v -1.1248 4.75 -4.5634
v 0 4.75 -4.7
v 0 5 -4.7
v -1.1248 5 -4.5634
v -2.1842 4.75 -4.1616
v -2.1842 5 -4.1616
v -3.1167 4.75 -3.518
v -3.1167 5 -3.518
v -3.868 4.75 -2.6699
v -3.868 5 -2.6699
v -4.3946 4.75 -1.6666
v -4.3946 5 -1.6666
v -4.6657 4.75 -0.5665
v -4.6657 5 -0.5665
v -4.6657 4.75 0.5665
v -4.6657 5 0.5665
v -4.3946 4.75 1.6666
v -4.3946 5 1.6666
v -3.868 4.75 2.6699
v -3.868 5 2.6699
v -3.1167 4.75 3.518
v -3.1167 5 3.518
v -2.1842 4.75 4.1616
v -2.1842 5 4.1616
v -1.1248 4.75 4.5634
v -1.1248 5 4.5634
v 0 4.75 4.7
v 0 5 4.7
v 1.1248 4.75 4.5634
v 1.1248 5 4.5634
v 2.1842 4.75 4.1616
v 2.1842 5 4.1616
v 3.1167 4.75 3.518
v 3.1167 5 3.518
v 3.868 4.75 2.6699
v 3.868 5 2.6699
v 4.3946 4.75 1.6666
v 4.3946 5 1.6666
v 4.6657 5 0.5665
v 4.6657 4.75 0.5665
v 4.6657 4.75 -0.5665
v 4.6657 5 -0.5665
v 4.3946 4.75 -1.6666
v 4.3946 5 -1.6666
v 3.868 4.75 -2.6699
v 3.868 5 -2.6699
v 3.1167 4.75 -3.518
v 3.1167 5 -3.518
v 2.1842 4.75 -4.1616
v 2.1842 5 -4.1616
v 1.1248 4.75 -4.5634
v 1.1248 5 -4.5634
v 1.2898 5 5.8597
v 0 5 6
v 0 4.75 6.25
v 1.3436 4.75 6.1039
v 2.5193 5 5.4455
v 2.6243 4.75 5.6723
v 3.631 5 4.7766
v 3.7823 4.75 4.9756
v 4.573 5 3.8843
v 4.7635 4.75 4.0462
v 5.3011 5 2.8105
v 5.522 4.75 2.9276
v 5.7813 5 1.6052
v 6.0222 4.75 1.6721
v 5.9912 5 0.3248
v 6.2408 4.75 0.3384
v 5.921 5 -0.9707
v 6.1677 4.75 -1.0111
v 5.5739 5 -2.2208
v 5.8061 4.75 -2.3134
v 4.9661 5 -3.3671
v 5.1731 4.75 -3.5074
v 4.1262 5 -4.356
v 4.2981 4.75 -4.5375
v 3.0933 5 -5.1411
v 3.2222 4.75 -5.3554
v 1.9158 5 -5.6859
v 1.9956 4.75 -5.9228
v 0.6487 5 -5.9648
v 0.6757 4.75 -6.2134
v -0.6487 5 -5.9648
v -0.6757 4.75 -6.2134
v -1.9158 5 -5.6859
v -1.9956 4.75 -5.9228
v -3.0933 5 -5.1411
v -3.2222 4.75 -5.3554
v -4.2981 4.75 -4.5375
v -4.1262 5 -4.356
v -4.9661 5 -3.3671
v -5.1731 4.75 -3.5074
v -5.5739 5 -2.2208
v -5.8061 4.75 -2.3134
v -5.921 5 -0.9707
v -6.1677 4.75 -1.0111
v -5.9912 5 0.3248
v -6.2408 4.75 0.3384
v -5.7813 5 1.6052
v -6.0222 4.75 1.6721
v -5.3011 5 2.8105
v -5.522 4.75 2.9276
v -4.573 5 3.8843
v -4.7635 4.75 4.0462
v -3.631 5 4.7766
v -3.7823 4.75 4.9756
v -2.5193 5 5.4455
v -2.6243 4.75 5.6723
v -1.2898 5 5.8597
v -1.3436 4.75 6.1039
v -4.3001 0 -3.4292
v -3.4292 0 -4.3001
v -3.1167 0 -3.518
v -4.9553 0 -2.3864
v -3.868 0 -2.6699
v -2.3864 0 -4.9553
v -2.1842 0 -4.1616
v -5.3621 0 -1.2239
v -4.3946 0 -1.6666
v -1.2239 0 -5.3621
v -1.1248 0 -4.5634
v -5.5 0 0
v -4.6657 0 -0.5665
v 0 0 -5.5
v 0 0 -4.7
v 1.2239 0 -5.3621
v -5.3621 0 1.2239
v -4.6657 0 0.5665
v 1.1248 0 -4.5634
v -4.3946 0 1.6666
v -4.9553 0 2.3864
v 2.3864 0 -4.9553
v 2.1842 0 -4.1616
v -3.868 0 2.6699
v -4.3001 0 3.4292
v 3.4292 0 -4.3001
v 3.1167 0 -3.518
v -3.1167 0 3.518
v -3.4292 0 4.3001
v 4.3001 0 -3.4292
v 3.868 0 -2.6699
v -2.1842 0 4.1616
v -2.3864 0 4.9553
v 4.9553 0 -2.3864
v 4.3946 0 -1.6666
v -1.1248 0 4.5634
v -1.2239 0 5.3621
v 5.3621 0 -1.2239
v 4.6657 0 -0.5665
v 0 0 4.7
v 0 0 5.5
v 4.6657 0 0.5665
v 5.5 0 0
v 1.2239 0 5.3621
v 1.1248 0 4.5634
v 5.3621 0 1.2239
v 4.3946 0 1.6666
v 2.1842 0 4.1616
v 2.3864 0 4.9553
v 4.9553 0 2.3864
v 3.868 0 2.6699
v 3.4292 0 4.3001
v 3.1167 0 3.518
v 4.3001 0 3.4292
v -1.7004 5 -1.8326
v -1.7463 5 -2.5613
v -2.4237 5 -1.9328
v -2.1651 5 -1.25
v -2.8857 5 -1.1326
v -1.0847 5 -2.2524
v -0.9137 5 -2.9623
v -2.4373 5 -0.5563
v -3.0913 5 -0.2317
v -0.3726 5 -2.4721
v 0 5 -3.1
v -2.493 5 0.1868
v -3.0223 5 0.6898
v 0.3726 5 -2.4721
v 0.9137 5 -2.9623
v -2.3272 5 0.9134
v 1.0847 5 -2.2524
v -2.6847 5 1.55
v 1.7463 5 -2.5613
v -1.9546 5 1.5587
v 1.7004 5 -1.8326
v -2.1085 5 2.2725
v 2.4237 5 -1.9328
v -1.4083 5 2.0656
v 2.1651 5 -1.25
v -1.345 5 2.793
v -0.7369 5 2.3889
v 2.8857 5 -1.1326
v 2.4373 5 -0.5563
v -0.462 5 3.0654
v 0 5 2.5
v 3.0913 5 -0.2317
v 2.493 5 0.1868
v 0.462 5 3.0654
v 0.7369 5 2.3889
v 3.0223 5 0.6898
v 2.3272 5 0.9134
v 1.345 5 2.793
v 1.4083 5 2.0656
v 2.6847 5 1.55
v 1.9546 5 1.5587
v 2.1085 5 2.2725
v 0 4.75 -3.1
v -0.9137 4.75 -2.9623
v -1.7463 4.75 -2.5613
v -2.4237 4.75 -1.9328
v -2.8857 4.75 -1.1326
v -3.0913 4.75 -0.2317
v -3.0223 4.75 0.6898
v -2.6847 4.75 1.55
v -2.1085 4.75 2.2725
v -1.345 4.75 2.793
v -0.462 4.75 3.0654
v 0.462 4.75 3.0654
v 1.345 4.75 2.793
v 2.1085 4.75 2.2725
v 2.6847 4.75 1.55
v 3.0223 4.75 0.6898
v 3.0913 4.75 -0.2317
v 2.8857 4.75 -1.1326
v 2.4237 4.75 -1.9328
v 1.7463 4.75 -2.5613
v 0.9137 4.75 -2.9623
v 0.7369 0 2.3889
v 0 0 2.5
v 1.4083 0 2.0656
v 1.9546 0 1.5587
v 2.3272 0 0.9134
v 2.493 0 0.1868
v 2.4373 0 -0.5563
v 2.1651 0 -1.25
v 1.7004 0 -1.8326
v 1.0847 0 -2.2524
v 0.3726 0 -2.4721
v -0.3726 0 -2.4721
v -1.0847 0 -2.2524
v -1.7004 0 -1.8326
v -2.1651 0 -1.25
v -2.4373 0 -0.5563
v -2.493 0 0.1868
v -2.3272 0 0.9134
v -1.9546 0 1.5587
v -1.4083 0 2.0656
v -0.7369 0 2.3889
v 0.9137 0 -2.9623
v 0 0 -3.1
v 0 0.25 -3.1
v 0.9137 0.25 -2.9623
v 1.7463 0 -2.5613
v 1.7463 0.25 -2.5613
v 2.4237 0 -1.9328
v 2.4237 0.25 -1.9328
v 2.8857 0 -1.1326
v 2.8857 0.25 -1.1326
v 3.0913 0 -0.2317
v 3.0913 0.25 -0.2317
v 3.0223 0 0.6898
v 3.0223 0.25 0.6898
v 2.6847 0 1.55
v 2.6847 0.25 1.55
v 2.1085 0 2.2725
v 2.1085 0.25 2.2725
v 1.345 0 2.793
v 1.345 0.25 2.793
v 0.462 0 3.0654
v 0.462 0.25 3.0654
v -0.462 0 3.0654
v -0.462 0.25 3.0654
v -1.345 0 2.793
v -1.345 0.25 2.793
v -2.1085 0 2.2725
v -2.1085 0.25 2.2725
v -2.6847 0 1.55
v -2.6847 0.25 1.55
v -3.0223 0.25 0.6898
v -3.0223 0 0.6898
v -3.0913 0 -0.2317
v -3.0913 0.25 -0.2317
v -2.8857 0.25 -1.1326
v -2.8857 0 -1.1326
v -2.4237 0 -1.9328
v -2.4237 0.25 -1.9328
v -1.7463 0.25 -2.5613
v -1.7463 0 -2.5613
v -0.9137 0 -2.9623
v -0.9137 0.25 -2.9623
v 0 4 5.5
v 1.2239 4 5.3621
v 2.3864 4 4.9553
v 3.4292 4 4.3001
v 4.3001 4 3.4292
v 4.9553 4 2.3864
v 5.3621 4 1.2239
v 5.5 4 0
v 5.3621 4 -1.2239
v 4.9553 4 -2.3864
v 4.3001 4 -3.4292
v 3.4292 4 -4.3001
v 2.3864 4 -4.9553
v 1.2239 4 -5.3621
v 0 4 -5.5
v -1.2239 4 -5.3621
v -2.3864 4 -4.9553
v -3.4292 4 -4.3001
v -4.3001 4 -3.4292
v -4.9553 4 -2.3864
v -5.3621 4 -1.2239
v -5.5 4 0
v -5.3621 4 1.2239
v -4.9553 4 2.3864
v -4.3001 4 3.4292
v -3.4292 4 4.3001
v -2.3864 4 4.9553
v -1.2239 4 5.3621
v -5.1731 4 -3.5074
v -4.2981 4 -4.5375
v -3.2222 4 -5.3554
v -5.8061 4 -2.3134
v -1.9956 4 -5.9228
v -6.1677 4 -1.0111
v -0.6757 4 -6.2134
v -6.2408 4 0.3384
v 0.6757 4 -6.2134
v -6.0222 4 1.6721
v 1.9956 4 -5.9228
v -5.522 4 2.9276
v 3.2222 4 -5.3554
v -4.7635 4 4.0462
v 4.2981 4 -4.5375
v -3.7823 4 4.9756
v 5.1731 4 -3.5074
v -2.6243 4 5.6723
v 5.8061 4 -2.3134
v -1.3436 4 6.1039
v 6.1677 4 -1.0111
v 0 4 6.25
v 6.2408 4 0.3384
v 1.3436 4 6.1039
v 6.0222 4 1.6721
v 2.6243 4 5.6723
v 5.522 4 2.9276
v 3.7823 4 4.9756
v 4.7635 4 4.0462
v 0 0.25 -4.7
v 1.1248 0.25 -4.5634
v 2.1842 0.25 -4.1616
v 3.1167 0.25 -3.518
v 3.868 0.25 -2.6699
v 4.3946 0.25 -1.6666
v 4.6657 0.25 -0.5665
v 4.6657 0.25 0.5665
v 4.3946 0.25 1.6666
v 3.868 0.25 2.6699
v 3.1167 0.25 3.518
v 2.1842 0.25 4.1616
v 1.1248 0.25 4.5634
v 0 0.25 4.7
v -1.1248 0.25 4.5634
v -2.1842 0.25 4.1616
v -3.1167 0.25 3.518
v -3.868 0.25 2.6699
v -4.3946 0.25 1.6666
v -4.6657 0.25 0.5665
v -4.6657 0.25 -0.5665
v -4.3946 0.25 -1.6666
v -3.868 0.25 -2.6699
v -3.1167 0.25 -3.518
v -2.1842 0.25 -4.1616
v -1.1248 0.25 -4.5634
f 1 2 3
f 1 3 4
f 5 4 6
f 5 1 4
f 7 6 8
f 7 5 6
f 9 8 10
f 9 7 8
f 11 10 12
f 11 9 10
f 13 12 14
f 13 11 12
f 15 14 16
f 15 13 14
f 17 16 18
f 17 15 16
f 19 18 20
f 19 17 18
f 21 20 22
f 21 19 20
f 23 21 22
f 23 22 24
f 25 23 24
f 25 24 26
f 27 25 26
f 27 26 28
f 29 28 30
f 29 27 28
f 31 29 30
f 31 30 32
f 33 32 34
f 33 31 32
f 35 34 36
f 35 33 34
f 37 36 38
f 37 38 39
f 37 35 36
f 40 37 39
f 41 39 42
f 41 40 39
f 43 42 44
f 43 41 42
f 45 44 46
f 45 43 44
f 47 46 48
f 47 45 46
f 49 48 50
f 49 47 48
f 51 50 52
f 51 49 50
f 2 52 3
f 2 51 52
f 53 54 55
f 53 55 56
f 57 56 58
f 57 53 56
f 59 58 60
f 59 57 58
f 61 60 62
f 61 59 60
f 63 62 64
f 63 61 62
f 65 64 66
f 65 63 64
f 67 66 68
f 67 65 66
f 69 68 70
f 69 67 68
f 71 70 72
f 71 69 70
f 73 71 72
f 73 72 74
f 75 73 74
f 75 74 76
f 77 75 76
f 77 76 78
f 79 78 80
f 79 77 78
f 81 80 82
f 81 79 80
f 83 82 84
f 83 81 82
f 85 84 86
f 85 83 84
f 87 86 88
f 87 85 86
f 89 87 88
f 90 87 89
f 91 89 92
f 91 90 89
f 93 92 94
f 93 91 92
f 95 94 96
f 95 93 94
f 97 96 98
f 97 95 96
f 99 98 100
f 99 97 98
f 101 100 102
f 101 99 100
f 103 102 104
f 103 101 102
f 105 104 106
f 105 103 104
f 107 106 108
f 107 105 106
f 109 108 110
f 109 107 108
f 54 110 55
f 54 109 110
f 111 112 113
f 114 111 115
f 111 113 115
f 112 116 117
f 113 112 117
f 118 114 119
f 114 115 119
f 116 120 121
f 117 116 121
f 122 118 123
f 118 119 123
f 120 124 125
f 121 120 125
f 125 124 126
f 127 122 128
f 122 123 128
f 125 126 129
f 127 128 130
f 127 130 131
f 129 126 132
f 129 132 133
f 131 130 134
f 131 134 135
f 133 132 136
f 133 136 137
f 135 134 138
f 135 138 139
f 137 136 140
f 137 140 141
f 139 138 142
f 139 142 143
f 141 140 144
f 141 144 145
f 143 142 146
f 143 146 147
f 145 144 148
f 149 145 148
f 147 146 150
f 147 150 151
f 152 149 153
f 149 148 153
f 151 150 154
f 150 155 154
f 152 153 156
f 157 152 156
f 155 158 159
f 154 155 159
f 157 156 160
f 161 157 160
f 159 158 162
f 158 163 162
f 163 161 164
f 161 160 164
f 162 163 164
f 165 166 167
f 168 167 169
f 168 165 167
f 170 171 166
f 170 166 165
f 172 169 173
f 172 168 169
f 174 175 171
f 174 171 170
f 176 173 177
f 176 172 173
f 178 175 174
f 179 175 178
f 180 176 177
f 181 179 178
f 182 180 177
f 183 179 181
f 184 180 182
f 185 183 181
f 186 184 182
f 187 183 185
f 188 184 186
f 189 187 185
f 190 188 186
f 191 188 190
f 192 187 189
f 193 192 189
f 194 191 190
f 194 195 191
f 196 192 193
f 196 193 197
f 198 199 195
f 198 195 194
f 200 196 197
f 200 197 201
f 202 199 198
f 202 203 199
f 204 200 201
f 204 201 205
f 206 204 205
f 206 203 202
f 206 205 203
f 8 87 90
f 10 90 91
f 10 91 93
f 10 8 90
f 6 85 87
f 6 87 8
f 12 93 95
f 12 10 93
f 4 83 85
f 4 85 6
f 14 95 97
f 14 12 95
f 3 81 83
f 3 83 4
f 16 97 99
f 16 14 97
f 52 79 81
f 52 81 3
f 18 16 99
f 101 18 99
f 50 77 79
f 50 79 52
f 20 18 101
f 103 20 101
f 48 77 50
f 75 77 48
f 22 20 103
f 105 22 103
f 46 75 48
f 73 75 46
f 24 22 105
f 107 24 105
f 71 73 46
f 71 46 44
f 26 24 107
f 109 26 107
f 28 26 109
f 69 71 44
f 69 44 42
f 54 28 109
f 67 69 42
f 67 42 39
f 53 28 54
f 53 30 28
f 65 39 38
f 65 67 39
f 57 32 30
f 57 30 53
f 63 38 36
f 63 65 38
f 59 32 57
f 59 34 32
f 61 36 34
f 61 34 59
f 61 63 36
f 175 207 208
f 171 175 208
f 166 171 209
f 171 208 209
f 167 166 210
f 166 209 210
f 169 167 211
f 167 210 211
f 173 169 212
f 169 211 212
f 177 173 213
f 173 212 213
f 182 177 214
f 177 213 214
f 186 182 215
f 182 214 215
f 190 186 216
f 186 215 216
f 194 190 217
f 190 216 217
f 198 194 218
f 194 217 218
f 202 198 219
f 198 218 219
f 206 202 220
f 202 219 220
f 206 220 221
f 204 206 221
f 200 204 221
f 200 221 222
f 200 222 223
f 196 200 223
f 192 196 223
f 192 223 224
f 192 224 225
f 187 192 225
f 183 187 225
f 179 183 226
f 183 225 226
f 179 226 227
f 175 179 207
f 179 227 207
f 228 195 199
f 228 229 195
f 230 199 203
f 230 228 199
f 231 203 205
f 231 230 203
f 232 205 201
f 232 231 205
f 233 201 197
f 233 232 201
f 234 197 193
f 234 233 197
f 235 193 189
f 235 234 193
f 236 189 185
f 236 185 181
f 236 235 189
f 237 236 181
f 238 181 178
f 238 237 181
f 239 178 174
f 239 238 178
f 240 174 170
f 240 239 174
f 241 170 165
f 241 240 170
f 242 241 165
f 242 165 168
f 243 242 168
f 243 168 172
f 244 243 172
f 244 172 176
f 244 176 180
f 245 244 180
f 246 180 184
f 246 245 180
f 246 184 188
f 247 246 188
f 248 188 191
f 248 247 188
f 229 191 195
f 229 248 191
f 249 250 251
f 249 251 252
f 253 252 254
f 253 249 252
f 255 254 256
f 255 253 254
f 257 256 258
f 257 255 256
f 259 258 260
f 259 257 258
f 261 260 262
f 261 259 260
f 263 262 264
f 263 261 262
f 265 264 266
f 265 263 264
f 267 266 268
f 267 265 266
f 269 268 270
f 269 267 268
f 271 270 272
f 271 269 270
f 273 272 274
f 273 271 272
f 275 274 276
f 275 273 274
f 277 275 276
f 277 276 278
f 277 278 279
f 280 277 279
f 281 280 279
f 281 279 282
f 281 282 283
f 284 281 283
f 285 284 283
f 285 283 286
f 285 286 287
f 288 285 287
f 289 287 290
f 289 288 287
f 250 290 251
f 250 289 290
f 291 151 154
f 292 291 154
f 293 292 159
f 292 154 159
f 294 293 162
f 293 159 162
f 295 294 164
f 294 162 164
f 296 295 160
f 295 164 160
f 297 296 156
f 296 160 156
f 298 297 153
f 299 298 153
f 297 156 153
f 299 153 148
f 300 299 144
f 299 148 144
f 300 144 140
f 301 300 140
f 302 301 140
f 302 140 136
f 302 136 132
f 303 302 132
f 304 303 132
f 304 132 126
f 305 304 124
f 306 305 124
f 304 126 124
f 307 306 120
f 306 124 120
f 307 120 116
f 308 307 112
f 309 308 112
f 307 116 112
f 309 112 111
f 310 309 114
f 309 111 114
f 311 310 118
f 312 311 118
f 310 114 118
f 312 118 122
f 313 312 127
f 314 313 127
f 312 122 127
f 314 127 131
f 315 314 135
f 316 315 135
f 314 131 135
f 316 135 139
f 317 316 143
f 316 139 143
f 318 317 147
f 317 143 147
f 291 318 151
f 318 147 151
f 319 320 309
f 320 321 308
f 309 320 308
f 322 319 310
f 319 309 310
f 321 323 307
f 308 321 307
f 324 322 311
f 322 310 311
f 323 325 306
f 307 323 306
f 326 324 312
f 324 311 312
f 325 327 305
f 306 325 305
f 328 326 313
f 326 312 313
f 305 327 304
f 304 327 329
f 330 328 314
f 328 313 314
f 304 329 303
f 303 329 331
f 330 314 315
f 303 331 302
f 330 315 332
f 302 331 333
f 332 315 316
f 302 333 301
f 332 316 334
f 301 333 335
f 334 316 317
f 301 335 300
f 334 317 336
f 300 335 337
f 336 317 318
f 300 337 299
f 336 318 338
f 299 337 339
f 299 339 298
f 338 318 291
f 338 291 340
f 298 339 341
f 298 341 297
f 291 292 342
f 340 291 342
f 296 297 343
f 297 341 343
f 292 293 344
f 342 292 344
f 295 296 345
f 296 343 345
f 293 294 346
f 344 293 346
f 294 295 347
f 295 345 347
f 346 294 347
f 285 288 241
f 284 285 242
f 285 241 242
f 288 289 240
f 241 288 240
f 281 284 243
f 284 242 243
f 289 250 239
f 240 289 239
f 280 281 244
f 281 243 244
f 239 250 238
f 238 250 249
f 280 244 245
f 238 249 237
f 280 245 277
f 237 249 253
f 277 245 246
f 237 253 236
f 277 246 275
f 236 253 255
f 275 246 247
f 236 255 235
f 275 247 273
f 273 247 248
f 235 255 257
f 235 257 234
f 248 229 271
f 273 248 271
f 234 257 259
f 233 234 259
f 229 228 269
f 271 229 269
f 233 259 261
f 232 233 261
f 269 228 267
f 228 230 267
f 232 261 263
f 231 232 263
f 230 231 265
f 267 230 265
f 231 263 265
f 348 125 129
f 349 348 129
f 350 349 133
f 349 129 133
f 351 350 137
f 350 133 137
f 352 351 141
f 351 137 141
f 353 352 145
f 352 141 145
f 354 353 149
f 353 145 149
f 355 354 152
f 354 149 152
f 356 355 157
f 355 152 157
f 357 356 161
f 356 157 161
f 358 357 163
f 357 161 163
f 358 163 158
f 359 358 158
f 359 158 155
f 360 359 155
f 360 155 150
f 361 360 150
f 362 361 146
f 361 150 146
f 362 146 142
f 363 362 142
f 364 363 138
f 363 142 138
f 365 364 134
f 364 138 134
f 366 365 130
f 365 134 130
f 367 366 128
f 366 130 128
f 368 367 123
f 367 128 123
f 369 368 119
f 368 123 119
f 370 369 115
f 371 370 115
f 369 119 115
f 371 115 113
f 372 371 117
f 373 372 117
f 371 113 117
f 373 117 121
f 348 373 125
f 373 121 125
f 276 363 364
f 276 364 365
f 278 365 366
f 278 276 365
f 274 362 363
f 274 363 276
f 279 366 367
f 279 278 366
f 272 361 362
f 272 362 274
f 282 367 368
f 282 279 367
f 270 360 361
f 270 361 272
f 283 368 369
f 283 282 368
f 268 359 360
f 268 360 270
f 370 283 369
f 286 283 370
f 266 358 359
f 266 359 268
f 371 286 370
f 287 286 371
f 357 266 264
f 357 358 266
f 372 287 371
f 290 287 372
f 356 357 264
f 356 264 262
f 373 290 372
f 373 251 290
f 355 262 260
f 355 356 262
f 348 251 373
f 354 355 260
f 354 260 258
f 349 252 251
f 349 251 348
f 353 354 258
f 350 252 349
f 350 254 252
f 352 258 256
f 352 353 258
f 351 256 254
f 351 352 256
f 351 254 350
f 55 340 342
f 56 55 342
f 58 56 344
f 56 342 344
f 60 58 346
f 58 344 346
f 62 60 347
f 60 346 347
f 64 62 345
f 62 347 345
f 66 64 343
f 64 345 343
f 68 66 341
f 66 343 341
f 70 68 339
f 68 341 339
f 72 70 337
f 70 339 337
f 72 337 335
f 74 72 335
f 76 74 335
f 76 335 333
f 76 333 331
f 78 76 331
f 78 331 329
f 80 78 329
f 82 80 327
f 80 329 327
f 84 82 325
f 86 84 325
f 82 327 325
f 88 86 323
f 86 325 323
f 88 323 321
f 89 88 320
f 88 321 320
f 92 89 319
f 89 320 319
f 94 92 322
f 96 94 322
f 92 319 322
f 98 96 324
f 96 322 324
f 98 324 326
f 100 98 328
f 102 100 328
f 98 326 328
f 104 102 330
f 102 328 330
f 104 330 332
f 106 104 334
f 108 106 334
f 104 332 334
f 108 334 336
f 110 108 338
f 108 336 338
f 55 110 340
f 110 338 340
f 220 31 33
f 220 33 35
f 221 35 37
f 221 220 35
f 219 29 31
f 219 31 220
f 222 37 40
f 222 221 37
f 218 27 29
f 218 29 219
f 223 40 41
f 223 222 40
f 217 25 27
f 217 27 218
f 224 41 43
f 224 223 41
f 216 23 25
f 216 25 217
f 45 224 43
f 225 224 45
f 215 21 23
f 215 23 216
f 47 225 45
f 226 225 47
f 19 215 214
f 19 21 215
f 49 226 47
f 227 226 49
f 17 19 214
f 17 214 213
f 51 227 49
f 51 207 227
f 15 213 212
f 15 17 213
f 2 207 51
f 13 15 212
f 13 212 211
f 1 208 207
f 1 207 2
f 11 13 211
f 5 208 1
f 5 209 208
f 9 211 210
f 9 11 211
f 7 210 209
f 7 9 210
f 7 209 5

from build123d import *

# Parameters (mm, degrees)
SKETCH1_R           = 5.5
SKETCH1_R_2         = 2.5
BOSS_EXTRUDE1_DEPTH = 4
SKETCH2_R           = 6.25
SKETCH2_R_2         = 2.5
BOSS_EXTRUDE2_DEPTH = 1
SKETCH3_R           = 4.7
SKETCH3_R_2         = 3.1
CUT_EXTRUDE1_DEPTH  = 0.25
CUT_EXTRUDE2_START  = -0.25
SKETCH4_R           = 4.7
SKETCH4_R_2         = 3.1
CUT_EXTRUDE2_DEPTH  = 0.25
CHAMFER1_SIZE       = 0.25


with BuildPart() as part:
    # Sketch1 → Boss-Extrude1 (new body)
    with BuildSketch(Plane(origin=(0, 0, 0), x_dir=(1, 0, 0), z_dir=(0, 1, 0))):
        Circle(SKETCH1_R)
        Circle(SKETCH1_R_2, mode=Mode.SUBTRACT)
    extrude(amount=BOSS_EXTRUDE1_DEPTH)

    # Sketch2 → Boss-Extrude2 (add)
    with BuildSketch(Plane(origin=(0, 4, 0), x_dir=(1, 0, 0), z_dir=(0, 1, 0))):
        Circle(SKETCH2_R)
        Circle(SKETCH2_R_2, mode=Mode.SUBTRACT)
    extrude(amount=BOSS_EXTRUDE2_DEPTH)

    # Sketch3 → Cut-Extrude1 (cut)
    with BuildSketch(Plane.XZ):
        Circle(SKETCH3_R)
        Circle(SKETCH3_R_2, mode=Mode.SUBTRACT)
    extrude(amount=-CUT_EXTRUDE1_DEPTH, mode=Mode.SUBTRACT)

    # Sketch4 → Cut-Extrude2 (cut)
    with BuildSketch(Plane(origin=(0, 5, 0), x_dir=(1, 0, 0), z_dir=(0, 1, 0)).offset(CUT_EXTRUDE2_START)):
        Circle(SKETCH4_R)
        Circle(SKETCH4_R_2, mode=Mode.SUBTRACT)
    extrude(amount=CUT_EXTRUDE2_DEPTH, mode=Mode.SUBTRACT)

    # Chamfer1
    chamfer1_edges = [part.edges().sort_by_distance(p)[0] for p in [
        (-6.25, 5, 0),
    ]]
    chamfer(chamfer1_edges, length=CHAMFER1_SIZE)


solid = part.part
